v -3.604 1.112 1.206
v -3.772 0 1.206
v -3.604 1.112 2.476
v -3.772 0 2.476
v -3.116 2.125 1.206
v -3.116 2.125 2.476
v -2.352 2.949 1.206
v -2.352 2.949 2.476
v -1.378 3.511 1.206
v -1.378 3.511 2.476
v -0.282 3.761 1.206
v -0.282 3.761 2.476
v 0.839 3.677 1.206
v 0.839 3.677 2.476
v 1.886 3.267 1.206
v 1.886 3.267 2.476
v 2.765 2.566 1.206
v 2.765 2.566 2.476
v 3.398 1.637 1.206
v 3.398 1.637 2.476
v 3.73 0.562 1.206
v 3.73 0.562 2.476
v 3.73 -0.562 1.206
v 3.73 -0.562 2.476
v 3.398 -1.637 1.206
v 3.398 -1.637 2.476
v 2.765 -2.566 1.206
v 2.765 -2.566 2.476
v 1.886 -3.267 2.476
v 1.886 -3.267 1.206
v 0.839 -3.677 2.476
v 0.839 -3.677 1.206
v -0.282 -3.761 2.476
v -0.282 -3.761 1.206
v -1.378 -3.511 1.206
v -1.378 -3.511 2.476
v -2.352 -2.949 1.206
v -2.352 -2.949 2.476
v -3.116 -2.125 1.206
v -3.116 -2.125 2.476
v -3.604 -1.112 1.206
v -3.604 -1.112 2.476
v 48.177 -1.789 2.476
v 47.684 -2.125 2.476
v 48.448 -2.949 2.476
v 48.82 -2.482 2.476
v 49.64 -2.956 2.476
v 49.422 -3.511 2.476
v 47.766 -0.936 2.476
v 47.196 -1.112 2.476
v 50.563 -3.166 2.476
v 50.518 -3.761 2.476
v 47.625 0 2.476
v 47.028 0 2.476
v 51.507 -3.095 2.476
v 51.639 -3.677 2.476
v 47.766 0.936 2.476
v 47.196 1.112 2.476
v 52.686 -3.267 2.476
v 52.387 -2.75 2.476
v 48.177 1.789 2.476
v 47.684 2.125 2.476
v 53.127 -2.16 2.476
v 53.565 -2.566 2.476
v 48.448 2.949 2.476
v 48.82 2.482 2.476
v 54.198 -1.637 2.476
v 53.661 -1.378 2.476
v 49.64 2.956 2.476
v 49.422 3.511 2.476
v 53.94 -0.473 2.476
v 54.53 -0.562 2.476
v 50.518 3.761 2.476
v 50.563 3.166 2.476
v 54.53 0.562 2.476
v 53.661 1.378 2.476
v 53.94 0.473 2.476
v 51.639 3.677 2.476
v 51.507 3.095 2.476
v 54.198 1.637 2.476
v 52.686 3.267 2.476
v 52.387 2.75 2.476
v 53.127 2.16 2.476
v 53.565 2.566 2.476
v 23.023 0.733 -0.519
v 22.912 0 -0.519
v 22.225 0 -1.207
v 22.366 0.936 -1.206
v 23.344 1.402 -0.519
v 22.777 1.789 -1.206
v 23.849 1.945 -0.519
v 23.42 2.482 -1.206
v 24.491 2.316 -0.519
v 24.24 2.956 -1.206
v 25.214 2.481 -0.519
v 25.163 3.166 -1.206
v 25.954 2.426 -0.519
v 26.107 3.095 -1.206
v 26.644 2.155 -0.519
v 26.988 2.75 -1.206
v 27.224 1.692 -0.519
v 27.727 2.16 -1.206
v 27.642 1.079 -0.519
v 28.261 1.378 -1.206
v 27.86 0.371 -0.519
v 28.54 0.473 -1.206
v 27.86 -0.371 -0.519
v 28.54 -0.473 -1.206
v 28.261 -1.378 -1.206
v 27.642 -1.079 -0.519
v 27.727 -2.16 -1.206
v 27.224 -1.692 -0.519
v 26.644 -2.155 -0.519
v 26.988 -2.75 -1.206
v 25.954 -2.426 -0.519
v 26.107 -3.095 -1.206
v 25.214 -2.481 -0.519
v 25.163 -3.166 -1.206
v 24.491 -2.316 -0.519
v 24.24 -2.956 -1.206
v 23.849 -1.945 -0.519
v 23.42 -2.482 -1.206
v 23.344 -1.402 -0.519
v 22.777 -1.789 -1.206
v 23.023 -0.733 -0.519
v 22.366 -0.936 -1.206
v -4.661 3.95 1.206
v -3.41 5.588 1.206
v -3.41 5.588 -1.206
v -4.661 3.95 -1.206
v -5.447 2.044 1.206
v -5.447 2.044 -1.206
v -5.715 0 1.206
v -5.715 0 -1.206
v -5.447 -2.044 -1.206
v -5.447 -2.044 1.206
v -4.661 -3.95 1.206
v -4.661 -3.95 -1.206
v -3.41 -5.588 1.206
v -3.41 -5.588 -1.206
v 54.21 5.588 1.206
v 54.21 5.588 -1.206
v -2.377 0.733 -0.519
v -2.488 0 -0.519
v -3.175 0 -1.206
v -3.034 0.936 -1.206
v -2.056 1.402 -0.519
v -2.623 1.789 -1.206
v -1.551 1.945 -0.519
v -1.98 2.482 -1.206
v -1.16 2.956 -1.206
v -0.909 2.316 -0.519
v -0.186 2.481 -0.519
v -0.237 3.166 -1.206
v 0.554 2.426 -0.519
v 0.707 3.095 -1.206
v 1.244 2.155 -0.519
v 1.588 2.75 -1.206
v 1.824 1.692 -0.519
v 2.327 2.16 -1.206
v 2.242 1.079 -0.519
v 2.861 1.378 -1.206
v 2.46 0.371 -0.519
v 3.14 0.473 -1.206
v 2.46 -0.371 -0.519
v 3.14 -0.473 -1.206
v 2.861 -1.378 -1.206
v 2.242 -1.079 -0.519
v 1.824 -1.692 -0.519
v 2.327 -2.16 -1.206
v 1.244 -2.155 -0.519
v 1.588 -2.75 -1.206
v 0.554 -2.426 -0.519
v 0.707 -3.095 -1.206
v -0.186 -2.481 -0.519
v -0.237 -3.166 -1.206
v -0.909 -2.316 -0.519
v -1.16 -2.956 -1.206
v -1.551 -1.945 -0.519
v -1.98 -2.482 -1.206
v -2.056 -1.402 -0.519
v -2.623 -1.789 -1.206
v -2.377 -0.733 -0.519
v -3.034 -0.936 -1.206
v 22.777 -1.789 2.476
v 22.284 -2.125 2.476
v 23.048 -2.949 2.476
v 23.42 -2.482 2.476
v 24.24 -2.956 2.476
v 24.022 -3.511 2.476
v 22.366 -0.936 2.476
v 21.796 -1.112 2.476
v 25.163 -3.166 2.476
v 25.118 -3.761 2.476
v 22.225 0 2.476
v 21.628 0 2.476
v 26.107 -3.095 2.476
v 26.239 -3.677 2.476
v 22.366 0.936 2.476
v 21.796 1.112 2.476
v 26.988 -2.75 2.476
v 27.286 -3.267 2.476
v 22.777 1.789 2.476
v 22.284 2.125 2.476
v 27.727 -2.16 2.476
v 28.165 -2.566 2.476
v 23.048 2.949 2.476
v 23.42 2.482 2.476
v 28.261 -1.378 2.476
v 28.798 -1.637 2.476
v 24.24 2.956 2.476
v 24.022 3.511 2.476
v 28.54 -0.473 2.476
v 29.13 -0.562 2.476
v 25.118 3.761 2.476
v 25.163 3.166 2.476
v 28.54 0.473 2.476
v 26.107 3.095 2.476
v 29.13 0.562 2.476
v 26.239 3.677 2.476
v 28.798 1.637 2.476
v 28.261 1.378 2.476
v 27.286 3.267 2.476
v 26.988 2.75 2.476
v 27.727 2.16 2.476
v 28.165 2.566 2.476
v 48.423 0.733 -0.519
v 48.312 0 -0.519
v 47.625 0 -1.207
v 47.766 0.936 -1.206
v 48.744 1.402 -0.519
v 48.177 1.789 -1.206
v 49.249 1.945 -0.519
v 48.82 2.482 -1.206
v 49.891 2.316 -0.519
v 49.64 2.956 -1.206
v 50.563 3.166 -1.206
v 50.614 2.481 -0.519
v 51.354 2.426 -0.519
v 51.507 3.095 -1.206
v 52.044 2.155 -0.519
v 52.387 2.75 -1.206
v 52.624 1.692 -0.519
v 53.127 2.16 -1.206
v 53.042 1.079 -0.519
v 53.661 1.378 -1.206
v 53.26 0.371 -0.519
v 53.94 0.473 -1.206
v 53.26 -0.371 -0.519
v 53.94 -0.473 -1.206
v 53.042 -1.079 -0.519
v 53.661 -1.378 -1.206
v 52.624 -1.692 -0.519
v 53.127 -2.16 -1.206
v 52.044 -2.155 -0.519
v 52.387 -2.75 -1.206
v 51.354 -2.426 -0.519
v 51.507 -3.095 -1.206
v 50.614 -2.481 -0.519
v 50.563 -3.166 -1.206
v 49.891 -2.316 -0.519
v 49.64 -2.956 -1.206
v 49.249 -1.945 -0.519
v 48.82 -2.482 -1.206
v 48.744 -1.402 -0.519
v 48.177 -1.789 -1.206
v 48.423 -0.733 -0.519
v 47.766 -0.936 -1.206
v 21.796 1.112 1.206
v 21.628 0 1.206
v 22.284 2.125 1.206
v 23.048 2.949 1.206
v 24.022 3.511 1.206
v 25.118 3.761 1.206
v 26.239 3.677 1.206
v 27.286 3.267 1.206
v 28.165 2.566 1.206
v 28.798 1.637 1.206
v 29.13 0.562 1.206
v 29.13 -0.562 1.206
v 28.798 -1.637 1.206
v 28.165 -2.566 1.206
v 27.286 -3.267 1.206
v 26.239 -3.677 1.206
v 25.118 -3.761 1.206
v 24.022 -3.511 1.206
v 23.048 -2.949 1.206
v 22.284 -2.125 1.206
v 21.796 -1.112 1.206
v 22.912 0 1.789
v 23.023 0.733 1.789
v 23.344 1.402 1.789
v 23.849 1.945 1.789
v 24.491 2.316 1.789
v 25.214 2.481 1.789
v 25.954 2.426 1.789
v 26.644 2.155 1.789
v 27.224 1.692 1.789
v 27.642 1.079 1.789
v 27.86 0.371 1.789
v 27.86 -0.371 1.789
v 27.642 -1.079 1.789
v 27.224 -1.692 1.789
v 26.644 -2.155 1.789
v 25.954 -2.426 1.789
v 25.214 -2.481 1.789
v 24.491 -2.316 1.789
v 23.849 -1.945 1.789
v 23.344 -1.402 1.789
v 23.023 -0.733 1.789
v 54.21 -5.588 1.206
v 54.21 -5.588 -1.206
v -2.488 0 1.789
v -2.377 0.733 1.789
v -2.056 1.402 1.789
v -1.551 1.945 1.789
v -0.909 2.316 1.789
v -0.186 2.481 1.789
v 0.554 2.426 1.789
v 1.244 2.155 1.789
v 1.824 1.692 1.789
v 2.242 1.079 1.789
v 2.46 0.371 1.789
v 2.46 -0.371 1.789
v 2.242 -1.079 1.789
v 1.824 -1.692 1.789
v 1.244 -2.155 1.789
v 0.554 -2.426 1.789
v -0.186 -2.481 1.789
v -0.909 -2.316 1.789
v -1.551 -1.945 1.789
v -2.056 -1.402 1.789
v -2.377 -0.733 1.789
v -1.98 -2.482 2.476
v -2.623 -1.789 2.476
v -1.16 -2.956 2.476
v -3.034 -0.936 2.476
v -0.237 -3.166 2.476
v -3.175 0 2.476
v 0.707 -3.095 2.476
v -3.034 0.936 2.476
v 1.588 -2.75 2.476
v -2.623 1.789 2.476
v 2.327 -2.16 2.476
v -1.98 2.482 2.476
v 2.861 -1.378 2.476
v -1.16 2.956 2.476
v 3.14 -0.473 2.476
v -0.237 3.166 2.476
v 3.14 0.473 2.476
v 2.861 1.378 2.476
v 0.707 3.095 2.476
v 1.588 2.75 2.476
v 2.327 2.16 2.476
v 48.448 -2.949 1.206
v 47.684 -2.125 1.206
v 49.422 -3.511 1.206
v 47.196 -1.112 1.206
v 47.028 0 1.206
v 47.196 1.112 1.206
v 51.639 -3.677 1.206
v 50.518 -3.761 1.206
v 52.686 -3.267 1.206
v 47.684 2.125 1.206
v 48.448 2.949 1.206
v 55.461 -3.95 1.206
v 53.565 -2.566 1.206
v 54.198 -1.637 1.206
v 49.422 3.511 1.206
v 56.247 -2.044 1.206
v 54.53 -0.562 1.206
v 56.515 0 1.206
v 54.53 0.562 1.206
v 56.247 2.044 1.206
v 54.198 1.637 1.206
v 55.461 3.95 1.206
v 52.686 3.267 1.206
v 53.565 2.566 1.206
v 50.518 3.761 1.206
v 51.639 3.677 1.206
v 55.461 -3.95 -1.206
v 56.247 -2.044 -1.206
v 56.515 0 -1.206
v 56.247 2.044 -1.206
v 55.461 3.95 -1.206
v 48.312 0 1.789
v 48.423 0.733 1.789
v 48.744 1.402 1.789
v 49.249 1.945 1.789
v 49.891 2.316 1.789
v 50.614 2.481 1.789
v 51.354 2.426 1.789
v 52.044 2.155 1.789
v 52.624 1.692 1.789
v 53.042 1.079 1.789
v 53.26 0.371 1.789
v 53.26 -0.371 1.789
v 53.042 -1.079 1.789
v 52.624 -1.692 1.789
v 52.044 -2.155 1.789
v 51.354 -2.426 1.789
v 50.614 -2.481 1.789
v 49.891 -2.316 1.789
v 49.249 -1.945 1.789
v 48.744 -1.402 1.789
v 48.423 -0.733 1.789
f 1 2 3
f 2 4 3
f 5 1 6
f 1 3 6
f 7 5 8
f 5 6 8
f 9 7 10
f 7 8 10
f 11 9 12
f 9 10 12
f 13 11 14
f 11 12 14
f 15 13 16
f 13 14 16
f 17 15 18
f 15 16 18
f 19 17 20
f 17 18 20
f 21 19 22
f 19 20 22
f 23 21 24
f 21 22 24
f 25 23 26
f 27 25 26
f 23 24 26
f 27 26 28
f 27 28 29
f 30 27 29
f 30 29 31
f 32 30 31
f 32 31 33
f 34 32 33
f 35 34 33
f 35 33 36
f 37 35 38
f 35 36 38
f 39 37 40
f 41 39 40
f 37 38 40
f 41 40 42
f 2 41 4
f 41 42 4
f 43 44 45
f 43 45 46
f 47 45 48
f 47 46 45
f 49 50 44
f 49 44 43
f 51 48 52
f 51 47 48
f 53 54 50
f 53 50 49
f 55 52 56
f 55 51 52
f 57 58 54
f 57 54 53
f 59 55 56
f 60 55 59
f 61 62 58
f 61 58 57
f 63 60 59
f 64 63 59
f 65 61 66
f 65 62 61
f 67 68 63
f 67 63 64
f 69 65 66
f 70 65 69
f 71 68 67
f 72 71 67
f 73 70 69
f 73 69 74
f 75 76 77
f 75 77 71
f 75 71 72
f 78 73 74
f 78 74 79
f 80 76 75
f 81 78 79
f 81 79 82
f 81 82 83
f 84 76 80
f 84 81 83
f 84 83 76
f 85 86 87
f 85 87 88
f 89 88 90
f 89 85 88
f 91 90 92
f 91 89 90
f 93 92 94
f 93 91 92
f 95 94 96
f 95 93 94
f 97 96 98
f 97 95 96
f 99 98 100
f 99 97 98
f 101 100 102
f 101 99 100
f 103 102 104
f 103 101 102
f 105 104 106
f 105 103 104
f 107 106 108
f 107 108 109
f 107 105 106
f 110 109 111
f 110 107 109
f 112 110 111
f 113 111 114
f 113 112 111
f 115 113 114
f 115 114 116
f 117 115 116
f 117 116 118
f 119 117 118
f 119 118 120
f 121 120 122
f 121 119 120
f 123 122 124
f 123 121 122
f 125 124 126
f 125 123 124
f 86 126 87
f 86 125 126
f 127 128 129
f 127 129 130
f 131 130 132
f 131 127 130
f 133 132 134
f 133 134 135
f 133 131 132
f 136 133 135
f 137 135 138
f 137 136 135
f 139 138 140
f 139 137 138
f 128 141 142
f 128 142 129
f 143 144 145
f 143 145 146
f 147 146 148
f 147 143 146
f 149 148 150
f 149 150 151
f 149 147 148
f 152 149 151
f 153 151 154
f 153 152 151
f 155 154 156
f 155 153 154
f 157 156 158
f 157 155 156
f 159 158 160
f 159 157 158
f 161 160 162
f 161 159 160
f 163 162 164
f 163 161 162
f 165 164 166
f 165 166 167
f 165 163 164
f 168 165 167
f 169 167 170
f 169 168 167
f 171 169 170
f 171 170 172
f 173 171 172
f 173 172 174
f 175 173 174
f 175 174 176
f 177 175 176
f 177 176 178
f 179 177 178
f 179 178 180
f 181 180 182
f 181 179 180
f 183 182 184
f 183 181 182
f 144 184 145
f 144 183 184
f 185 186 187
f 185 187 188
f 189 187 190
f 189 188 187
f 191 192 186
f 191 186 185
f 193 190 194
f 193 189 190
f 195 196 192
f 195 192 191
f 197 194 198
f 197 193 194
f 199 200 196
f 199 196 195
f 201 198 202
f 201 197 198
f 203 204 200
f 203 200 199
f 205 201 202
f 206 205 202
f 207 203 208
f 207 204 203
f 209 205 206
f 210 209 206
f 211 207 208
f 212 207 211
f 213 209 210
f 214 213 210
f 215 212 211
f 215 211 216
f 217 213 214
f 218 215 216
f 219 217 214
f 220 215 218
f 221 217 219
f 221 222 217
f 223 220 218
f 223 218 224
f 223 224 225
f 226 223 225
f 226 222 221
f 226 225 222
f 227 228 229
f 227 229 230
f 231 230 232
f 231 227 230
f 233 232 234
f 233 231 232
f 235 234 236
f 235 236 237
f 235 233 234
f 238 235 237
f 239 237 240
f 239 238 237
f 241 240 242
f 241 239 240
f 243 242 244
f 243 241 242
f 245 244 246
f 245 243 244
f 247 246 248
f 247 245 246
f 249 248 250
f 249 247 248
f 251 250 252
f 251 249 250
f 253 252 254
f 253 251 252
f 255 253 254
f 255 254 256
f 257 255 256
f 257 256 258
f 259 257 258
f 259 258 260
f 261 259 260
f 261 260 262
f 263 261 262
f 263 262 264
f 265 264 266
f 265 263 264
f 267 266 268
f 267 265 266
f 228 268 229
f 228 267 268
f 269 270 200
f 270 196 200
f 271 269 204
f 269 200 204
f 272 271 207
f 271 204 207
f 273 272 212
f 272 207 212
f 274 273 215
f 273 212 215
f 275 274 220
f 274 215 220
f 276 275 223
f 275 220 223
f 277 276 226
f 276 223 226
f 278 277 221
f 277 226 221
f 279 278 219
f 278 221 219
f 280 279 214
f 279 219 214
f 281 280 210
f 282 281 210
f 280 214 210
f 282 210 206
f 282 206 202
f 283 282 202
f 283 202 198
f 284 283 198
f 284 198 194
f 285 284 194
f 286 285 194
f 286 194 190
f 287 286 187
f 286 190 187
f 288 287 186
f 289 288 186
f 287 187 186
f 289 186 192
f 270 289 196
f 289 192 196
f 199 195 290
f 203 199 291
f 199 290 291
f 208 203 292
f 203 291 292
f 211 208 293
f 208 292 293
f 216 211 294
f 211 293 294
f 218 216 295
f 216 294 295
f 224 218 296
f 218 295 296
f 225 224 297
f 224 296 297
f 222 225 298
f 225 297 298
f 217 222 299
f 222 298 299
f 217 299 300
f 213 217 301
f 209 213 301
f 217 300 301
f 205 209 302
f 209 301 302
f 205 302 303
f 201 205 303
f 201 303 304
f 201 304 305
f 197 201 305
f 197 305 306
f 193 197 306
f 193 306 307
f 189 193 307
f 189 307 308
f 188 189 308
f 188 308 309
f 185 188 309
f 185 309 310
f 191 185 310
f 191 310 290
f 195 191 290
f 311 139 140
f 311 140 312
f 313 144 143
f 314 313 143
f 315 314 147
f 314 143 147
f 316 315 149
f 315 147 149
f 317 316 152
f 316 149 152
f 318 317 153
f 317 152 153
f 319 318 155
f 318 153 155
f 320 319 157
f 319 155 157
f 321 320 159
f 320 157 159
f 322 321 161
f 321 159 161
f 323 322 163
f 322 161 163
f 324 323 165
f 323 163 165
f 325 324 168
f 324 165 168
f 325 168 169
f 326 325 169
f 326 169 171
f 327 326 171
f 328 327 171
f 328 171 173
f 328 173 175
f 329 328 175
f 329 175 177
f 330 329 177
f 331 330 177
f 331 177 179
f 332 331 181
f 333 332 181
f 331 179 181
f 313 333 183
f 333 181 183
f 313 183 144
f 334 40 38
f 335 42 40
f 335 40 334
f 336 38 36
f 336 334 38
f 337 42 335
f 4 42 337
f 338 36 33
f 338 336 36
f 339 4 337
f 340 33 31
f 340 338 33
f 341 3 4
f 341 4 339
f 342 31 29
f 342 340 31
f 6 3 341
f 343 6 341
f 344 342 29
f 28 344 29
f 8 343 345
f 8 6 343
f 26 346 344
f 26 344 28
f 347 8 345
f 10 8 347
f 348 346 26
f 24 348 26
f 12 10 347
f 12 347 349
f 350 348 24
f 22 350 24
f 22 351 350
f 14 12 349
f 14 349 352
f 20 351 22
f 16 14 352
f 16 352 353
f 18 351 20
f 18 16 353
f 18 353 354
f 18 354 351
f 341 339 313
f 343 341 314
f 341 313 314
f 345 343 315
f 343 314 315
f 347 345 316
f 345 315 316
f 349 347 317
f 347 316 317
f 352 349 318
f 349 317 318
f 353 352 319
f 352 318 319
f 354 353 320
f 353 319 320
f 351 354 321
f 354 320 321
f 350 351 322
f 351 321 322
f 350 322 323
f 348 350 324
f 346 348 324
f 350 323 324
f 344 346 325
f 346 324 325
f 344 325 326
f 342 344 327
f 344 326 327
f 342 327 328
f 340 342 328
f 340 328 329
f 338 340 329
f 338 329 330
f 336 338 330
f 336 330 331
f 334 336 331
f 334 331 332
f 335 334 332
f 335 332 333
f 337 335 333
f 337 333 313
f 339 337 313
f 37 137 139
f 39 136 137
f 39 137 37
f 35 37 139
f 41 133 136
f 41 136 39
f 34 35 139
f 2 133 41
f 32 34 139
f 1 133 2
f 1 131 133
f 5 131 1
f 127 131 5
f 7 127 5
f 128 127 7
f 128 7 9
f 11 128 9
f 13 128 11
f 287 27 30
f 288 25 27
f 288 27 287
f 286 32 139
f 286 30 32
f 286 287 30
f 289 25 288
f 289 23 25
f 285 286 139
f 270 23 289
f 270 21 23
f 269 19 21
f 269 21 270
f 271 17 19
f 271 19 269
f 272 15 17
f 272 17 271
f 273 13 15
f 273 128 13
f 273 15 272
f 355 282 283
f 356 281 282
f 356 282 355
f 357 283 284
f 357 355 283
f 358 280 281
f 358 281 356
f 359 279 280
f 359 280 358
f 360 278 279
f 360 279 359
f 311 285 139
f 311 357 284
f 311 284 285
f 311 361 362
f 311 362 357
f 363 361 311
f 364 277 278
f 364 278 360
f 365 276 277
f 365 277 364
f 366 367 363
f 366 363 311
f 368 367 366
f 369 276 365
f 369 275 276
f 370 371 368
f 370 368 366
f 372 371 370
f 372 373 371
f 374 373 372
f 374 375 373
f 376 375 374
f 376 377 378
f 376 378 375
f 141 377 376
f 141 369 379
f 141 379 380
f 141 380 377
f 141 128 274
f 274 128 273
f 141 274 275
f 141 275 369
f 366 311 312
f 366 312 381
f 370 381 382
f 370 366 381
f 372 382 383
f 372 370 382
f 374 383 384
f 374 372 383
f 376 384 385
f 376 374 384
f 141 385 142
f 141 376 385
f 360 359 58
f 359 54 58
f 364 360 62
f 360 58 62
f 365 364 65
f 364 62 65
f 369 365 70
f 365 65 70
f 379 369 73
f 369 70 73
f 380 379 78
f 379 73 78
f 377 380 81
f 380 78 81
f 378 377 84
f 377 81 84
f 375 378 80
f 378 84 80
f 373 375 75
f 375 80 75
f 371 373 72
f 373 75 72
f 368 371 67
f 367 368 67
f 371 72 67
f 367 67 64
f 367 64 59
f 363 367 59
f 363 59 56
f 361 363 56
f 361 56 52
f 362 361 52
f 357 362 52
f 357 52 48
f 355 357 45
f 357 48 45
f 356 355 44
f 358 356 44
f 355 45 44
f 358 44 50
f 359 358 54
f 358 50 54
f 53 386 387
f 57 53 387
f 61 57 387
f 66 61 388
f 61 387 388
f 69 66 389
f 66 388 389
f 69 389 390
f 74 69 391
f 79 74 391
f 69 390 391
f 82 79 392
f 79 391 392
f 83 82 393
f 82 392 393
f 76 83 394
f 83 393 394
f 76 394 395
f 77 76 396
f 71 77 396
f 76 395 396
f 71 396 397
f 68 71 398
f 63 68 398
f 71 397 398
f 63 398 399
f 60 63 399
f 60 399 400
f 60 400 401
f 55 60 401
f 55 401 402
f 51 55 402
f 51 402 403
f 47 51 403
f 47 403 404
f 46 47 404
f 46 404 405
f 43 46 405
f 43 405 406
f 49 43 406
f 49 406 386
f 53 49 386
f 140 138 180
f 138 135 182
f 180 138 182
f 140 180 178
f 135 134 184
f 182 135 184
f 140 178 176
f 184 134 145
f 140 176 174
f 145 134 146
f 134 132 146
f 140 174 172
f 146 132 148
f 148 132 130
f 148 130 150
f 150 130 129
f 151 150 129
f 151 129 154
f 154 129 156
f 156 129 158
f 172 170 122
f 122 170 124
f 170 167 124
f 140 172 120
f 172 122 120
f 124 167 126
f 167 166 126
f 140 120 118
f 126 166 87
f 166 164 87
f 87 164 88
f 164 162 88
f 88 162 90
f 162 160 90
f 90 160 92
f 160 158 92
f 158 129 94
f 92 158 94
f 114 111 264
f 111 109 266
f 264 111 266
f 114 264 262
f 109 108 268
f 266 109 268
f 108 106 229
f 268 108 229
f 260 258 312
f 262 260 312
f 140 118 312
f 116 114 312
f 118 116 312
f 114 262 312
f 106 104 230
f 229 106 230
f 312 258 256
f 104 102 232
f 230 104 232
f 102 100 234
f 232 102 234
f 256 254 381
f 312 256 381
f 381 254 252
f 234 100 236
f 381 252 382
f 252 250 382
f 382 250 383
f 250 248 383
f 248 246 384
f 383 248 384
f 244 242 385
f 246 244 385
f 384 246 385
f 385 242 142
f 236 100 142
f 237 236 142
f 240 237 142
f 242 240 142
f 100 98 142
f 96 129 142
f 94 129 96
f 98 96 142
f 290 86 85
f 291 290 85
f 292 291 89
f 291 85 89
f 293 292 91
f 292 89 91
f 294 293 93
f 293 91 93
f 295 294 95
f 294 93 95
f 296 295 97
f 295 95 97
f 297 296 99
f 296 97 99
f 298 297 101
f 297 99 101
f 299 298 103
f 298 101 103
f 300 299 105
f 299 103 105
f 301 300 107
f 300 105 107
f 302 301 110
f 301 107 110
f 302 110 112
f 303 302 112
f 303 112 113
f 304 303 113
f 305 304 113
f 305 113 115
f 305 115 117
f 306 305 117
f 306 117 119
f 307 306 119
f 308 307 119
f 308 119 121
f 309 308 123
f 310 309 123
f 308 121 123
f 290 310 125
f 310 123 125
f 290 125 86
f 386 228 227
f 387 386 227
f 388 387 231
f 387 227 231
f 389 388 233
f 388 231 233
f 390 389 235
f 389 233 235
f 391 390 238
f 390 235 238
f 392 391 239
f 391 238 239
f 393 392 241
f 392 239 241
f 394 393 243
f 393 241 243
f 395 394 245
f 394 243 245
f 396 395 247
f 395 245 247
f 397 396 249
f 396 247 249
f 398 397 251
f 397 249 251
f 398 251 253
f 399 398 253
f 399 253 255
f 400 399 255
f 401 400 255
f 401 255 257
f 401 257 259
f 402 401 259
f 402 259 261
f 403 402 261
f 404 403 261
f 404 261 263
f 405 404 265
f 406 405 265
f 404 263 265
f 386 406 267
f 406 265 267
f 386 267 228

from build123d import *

# Parameters (mm, degrees)
BOSS_EXTRUDE1_DEPTH = 2.413
SKETCH2_W           = 3.7719
SKETCH2_H           = 1.27
SKETCH3_W           = 3.7719
SKETCH3_H           = 1.27
SKETCH4_W           = 3.7719
SKETCH4_H           = 1.27
HOLE1_D             = 4.97586
HOLE1_CSINK_D       = 6.35
HOLE1_CSINK_ANGLE   = 90
CHAMFER1_SIZE       = 0.68707


with BuildPart() as part:
    # Sketch1 → Boss-Extrude1 (new body)
    with BuildSketch(Plane.XY.offset(1.2065)):
        with BuildLine():
            Line((54.209515887, 5.588), (-3.409515887, 5.588))
            ThreePointArc((-3.409515887, 5.588), (-5.715, 0), (-3.409515887, -5.588))
            Line((-3.409515887, -5.588), (54.209515887, -5.588))
            ThreePointArc((54.209515887, -5.588), (56.515, 0), (54.209515887, 5.588))
        make_face()
    extrude(amount=-BOSS_EXTRUDE1_DEPTH)

    # Sketch2 → Revolve1 (revolve)
    with BuildSketch(Plane.XZ, mode=Mode.PRIVATE) as revolve1_sk:
        with Locations((27.28595, 1.8415)):
            Rectangle(SKETCH2_W, SKETCH2_H)
    revolve(revolve1_sk.sketch.rotate(Axis((25.4, 0, 2.4765), (0, 0, -1)), 180), axis=Axis((25.4, 0, 2.4765), (0, 0, -1)))

    # Sketch3 → Revolve2 (revolve)
    with BuildSketch(Plane.XZ, mode=Mode.PRIVATE) as revolve2_sk:
        with Locations((1.88595, 1.8415)):
            Rectangle(SKETCH3_W, SKETCH3_H)
    revolve(revolve2_sk.sketch.rotate(Axis((0, 0, 2.4765), (0, 0, -1)), 180), axis=Axis((0, 0, 2.4765), (0, 0, -1)))

    # Sketch4 → Revolve3 (revolve)
    with BuildSketch(Plane.XZ, mode=Mode.PRIVATE) as revolve3_sk:
        with Locations((52.68595, 1.8415)):
            Rectangle(SKETCH4_W, SKETCH4_H)
    revolve(revolve3_sk.sketch.rotate(Axis((50.8, 0, 2.4765), (0, 0, -1)), 180), axis=Axis((50.8, 0, 2.4765), (0, 0, -1)))

    # Hole1 (through all)
    with Locations(Plane.XY.offset(2.4765)):
        with Locations((0, 0), (25.4, 0), (50.8, 0)):
            CounterSinkHole(HOLE1_D / 2, HOLE1_CSINK_D / 2, counter_sink_angle=HOLE1_CSINK_ANGLE)

    # Chamfer1
    chamfer1_edges = [part.edges().sort_by_distance(p)[0] for p in [
        (53.28793, 0, -1.2065),
        (27.88793, 0, -1.2065),
        (2.48793, 0, -1.2065),
    ]]
    chamfer(chamfer1_edges, length=CHAMFER1_SIZE)


solid = part.part
